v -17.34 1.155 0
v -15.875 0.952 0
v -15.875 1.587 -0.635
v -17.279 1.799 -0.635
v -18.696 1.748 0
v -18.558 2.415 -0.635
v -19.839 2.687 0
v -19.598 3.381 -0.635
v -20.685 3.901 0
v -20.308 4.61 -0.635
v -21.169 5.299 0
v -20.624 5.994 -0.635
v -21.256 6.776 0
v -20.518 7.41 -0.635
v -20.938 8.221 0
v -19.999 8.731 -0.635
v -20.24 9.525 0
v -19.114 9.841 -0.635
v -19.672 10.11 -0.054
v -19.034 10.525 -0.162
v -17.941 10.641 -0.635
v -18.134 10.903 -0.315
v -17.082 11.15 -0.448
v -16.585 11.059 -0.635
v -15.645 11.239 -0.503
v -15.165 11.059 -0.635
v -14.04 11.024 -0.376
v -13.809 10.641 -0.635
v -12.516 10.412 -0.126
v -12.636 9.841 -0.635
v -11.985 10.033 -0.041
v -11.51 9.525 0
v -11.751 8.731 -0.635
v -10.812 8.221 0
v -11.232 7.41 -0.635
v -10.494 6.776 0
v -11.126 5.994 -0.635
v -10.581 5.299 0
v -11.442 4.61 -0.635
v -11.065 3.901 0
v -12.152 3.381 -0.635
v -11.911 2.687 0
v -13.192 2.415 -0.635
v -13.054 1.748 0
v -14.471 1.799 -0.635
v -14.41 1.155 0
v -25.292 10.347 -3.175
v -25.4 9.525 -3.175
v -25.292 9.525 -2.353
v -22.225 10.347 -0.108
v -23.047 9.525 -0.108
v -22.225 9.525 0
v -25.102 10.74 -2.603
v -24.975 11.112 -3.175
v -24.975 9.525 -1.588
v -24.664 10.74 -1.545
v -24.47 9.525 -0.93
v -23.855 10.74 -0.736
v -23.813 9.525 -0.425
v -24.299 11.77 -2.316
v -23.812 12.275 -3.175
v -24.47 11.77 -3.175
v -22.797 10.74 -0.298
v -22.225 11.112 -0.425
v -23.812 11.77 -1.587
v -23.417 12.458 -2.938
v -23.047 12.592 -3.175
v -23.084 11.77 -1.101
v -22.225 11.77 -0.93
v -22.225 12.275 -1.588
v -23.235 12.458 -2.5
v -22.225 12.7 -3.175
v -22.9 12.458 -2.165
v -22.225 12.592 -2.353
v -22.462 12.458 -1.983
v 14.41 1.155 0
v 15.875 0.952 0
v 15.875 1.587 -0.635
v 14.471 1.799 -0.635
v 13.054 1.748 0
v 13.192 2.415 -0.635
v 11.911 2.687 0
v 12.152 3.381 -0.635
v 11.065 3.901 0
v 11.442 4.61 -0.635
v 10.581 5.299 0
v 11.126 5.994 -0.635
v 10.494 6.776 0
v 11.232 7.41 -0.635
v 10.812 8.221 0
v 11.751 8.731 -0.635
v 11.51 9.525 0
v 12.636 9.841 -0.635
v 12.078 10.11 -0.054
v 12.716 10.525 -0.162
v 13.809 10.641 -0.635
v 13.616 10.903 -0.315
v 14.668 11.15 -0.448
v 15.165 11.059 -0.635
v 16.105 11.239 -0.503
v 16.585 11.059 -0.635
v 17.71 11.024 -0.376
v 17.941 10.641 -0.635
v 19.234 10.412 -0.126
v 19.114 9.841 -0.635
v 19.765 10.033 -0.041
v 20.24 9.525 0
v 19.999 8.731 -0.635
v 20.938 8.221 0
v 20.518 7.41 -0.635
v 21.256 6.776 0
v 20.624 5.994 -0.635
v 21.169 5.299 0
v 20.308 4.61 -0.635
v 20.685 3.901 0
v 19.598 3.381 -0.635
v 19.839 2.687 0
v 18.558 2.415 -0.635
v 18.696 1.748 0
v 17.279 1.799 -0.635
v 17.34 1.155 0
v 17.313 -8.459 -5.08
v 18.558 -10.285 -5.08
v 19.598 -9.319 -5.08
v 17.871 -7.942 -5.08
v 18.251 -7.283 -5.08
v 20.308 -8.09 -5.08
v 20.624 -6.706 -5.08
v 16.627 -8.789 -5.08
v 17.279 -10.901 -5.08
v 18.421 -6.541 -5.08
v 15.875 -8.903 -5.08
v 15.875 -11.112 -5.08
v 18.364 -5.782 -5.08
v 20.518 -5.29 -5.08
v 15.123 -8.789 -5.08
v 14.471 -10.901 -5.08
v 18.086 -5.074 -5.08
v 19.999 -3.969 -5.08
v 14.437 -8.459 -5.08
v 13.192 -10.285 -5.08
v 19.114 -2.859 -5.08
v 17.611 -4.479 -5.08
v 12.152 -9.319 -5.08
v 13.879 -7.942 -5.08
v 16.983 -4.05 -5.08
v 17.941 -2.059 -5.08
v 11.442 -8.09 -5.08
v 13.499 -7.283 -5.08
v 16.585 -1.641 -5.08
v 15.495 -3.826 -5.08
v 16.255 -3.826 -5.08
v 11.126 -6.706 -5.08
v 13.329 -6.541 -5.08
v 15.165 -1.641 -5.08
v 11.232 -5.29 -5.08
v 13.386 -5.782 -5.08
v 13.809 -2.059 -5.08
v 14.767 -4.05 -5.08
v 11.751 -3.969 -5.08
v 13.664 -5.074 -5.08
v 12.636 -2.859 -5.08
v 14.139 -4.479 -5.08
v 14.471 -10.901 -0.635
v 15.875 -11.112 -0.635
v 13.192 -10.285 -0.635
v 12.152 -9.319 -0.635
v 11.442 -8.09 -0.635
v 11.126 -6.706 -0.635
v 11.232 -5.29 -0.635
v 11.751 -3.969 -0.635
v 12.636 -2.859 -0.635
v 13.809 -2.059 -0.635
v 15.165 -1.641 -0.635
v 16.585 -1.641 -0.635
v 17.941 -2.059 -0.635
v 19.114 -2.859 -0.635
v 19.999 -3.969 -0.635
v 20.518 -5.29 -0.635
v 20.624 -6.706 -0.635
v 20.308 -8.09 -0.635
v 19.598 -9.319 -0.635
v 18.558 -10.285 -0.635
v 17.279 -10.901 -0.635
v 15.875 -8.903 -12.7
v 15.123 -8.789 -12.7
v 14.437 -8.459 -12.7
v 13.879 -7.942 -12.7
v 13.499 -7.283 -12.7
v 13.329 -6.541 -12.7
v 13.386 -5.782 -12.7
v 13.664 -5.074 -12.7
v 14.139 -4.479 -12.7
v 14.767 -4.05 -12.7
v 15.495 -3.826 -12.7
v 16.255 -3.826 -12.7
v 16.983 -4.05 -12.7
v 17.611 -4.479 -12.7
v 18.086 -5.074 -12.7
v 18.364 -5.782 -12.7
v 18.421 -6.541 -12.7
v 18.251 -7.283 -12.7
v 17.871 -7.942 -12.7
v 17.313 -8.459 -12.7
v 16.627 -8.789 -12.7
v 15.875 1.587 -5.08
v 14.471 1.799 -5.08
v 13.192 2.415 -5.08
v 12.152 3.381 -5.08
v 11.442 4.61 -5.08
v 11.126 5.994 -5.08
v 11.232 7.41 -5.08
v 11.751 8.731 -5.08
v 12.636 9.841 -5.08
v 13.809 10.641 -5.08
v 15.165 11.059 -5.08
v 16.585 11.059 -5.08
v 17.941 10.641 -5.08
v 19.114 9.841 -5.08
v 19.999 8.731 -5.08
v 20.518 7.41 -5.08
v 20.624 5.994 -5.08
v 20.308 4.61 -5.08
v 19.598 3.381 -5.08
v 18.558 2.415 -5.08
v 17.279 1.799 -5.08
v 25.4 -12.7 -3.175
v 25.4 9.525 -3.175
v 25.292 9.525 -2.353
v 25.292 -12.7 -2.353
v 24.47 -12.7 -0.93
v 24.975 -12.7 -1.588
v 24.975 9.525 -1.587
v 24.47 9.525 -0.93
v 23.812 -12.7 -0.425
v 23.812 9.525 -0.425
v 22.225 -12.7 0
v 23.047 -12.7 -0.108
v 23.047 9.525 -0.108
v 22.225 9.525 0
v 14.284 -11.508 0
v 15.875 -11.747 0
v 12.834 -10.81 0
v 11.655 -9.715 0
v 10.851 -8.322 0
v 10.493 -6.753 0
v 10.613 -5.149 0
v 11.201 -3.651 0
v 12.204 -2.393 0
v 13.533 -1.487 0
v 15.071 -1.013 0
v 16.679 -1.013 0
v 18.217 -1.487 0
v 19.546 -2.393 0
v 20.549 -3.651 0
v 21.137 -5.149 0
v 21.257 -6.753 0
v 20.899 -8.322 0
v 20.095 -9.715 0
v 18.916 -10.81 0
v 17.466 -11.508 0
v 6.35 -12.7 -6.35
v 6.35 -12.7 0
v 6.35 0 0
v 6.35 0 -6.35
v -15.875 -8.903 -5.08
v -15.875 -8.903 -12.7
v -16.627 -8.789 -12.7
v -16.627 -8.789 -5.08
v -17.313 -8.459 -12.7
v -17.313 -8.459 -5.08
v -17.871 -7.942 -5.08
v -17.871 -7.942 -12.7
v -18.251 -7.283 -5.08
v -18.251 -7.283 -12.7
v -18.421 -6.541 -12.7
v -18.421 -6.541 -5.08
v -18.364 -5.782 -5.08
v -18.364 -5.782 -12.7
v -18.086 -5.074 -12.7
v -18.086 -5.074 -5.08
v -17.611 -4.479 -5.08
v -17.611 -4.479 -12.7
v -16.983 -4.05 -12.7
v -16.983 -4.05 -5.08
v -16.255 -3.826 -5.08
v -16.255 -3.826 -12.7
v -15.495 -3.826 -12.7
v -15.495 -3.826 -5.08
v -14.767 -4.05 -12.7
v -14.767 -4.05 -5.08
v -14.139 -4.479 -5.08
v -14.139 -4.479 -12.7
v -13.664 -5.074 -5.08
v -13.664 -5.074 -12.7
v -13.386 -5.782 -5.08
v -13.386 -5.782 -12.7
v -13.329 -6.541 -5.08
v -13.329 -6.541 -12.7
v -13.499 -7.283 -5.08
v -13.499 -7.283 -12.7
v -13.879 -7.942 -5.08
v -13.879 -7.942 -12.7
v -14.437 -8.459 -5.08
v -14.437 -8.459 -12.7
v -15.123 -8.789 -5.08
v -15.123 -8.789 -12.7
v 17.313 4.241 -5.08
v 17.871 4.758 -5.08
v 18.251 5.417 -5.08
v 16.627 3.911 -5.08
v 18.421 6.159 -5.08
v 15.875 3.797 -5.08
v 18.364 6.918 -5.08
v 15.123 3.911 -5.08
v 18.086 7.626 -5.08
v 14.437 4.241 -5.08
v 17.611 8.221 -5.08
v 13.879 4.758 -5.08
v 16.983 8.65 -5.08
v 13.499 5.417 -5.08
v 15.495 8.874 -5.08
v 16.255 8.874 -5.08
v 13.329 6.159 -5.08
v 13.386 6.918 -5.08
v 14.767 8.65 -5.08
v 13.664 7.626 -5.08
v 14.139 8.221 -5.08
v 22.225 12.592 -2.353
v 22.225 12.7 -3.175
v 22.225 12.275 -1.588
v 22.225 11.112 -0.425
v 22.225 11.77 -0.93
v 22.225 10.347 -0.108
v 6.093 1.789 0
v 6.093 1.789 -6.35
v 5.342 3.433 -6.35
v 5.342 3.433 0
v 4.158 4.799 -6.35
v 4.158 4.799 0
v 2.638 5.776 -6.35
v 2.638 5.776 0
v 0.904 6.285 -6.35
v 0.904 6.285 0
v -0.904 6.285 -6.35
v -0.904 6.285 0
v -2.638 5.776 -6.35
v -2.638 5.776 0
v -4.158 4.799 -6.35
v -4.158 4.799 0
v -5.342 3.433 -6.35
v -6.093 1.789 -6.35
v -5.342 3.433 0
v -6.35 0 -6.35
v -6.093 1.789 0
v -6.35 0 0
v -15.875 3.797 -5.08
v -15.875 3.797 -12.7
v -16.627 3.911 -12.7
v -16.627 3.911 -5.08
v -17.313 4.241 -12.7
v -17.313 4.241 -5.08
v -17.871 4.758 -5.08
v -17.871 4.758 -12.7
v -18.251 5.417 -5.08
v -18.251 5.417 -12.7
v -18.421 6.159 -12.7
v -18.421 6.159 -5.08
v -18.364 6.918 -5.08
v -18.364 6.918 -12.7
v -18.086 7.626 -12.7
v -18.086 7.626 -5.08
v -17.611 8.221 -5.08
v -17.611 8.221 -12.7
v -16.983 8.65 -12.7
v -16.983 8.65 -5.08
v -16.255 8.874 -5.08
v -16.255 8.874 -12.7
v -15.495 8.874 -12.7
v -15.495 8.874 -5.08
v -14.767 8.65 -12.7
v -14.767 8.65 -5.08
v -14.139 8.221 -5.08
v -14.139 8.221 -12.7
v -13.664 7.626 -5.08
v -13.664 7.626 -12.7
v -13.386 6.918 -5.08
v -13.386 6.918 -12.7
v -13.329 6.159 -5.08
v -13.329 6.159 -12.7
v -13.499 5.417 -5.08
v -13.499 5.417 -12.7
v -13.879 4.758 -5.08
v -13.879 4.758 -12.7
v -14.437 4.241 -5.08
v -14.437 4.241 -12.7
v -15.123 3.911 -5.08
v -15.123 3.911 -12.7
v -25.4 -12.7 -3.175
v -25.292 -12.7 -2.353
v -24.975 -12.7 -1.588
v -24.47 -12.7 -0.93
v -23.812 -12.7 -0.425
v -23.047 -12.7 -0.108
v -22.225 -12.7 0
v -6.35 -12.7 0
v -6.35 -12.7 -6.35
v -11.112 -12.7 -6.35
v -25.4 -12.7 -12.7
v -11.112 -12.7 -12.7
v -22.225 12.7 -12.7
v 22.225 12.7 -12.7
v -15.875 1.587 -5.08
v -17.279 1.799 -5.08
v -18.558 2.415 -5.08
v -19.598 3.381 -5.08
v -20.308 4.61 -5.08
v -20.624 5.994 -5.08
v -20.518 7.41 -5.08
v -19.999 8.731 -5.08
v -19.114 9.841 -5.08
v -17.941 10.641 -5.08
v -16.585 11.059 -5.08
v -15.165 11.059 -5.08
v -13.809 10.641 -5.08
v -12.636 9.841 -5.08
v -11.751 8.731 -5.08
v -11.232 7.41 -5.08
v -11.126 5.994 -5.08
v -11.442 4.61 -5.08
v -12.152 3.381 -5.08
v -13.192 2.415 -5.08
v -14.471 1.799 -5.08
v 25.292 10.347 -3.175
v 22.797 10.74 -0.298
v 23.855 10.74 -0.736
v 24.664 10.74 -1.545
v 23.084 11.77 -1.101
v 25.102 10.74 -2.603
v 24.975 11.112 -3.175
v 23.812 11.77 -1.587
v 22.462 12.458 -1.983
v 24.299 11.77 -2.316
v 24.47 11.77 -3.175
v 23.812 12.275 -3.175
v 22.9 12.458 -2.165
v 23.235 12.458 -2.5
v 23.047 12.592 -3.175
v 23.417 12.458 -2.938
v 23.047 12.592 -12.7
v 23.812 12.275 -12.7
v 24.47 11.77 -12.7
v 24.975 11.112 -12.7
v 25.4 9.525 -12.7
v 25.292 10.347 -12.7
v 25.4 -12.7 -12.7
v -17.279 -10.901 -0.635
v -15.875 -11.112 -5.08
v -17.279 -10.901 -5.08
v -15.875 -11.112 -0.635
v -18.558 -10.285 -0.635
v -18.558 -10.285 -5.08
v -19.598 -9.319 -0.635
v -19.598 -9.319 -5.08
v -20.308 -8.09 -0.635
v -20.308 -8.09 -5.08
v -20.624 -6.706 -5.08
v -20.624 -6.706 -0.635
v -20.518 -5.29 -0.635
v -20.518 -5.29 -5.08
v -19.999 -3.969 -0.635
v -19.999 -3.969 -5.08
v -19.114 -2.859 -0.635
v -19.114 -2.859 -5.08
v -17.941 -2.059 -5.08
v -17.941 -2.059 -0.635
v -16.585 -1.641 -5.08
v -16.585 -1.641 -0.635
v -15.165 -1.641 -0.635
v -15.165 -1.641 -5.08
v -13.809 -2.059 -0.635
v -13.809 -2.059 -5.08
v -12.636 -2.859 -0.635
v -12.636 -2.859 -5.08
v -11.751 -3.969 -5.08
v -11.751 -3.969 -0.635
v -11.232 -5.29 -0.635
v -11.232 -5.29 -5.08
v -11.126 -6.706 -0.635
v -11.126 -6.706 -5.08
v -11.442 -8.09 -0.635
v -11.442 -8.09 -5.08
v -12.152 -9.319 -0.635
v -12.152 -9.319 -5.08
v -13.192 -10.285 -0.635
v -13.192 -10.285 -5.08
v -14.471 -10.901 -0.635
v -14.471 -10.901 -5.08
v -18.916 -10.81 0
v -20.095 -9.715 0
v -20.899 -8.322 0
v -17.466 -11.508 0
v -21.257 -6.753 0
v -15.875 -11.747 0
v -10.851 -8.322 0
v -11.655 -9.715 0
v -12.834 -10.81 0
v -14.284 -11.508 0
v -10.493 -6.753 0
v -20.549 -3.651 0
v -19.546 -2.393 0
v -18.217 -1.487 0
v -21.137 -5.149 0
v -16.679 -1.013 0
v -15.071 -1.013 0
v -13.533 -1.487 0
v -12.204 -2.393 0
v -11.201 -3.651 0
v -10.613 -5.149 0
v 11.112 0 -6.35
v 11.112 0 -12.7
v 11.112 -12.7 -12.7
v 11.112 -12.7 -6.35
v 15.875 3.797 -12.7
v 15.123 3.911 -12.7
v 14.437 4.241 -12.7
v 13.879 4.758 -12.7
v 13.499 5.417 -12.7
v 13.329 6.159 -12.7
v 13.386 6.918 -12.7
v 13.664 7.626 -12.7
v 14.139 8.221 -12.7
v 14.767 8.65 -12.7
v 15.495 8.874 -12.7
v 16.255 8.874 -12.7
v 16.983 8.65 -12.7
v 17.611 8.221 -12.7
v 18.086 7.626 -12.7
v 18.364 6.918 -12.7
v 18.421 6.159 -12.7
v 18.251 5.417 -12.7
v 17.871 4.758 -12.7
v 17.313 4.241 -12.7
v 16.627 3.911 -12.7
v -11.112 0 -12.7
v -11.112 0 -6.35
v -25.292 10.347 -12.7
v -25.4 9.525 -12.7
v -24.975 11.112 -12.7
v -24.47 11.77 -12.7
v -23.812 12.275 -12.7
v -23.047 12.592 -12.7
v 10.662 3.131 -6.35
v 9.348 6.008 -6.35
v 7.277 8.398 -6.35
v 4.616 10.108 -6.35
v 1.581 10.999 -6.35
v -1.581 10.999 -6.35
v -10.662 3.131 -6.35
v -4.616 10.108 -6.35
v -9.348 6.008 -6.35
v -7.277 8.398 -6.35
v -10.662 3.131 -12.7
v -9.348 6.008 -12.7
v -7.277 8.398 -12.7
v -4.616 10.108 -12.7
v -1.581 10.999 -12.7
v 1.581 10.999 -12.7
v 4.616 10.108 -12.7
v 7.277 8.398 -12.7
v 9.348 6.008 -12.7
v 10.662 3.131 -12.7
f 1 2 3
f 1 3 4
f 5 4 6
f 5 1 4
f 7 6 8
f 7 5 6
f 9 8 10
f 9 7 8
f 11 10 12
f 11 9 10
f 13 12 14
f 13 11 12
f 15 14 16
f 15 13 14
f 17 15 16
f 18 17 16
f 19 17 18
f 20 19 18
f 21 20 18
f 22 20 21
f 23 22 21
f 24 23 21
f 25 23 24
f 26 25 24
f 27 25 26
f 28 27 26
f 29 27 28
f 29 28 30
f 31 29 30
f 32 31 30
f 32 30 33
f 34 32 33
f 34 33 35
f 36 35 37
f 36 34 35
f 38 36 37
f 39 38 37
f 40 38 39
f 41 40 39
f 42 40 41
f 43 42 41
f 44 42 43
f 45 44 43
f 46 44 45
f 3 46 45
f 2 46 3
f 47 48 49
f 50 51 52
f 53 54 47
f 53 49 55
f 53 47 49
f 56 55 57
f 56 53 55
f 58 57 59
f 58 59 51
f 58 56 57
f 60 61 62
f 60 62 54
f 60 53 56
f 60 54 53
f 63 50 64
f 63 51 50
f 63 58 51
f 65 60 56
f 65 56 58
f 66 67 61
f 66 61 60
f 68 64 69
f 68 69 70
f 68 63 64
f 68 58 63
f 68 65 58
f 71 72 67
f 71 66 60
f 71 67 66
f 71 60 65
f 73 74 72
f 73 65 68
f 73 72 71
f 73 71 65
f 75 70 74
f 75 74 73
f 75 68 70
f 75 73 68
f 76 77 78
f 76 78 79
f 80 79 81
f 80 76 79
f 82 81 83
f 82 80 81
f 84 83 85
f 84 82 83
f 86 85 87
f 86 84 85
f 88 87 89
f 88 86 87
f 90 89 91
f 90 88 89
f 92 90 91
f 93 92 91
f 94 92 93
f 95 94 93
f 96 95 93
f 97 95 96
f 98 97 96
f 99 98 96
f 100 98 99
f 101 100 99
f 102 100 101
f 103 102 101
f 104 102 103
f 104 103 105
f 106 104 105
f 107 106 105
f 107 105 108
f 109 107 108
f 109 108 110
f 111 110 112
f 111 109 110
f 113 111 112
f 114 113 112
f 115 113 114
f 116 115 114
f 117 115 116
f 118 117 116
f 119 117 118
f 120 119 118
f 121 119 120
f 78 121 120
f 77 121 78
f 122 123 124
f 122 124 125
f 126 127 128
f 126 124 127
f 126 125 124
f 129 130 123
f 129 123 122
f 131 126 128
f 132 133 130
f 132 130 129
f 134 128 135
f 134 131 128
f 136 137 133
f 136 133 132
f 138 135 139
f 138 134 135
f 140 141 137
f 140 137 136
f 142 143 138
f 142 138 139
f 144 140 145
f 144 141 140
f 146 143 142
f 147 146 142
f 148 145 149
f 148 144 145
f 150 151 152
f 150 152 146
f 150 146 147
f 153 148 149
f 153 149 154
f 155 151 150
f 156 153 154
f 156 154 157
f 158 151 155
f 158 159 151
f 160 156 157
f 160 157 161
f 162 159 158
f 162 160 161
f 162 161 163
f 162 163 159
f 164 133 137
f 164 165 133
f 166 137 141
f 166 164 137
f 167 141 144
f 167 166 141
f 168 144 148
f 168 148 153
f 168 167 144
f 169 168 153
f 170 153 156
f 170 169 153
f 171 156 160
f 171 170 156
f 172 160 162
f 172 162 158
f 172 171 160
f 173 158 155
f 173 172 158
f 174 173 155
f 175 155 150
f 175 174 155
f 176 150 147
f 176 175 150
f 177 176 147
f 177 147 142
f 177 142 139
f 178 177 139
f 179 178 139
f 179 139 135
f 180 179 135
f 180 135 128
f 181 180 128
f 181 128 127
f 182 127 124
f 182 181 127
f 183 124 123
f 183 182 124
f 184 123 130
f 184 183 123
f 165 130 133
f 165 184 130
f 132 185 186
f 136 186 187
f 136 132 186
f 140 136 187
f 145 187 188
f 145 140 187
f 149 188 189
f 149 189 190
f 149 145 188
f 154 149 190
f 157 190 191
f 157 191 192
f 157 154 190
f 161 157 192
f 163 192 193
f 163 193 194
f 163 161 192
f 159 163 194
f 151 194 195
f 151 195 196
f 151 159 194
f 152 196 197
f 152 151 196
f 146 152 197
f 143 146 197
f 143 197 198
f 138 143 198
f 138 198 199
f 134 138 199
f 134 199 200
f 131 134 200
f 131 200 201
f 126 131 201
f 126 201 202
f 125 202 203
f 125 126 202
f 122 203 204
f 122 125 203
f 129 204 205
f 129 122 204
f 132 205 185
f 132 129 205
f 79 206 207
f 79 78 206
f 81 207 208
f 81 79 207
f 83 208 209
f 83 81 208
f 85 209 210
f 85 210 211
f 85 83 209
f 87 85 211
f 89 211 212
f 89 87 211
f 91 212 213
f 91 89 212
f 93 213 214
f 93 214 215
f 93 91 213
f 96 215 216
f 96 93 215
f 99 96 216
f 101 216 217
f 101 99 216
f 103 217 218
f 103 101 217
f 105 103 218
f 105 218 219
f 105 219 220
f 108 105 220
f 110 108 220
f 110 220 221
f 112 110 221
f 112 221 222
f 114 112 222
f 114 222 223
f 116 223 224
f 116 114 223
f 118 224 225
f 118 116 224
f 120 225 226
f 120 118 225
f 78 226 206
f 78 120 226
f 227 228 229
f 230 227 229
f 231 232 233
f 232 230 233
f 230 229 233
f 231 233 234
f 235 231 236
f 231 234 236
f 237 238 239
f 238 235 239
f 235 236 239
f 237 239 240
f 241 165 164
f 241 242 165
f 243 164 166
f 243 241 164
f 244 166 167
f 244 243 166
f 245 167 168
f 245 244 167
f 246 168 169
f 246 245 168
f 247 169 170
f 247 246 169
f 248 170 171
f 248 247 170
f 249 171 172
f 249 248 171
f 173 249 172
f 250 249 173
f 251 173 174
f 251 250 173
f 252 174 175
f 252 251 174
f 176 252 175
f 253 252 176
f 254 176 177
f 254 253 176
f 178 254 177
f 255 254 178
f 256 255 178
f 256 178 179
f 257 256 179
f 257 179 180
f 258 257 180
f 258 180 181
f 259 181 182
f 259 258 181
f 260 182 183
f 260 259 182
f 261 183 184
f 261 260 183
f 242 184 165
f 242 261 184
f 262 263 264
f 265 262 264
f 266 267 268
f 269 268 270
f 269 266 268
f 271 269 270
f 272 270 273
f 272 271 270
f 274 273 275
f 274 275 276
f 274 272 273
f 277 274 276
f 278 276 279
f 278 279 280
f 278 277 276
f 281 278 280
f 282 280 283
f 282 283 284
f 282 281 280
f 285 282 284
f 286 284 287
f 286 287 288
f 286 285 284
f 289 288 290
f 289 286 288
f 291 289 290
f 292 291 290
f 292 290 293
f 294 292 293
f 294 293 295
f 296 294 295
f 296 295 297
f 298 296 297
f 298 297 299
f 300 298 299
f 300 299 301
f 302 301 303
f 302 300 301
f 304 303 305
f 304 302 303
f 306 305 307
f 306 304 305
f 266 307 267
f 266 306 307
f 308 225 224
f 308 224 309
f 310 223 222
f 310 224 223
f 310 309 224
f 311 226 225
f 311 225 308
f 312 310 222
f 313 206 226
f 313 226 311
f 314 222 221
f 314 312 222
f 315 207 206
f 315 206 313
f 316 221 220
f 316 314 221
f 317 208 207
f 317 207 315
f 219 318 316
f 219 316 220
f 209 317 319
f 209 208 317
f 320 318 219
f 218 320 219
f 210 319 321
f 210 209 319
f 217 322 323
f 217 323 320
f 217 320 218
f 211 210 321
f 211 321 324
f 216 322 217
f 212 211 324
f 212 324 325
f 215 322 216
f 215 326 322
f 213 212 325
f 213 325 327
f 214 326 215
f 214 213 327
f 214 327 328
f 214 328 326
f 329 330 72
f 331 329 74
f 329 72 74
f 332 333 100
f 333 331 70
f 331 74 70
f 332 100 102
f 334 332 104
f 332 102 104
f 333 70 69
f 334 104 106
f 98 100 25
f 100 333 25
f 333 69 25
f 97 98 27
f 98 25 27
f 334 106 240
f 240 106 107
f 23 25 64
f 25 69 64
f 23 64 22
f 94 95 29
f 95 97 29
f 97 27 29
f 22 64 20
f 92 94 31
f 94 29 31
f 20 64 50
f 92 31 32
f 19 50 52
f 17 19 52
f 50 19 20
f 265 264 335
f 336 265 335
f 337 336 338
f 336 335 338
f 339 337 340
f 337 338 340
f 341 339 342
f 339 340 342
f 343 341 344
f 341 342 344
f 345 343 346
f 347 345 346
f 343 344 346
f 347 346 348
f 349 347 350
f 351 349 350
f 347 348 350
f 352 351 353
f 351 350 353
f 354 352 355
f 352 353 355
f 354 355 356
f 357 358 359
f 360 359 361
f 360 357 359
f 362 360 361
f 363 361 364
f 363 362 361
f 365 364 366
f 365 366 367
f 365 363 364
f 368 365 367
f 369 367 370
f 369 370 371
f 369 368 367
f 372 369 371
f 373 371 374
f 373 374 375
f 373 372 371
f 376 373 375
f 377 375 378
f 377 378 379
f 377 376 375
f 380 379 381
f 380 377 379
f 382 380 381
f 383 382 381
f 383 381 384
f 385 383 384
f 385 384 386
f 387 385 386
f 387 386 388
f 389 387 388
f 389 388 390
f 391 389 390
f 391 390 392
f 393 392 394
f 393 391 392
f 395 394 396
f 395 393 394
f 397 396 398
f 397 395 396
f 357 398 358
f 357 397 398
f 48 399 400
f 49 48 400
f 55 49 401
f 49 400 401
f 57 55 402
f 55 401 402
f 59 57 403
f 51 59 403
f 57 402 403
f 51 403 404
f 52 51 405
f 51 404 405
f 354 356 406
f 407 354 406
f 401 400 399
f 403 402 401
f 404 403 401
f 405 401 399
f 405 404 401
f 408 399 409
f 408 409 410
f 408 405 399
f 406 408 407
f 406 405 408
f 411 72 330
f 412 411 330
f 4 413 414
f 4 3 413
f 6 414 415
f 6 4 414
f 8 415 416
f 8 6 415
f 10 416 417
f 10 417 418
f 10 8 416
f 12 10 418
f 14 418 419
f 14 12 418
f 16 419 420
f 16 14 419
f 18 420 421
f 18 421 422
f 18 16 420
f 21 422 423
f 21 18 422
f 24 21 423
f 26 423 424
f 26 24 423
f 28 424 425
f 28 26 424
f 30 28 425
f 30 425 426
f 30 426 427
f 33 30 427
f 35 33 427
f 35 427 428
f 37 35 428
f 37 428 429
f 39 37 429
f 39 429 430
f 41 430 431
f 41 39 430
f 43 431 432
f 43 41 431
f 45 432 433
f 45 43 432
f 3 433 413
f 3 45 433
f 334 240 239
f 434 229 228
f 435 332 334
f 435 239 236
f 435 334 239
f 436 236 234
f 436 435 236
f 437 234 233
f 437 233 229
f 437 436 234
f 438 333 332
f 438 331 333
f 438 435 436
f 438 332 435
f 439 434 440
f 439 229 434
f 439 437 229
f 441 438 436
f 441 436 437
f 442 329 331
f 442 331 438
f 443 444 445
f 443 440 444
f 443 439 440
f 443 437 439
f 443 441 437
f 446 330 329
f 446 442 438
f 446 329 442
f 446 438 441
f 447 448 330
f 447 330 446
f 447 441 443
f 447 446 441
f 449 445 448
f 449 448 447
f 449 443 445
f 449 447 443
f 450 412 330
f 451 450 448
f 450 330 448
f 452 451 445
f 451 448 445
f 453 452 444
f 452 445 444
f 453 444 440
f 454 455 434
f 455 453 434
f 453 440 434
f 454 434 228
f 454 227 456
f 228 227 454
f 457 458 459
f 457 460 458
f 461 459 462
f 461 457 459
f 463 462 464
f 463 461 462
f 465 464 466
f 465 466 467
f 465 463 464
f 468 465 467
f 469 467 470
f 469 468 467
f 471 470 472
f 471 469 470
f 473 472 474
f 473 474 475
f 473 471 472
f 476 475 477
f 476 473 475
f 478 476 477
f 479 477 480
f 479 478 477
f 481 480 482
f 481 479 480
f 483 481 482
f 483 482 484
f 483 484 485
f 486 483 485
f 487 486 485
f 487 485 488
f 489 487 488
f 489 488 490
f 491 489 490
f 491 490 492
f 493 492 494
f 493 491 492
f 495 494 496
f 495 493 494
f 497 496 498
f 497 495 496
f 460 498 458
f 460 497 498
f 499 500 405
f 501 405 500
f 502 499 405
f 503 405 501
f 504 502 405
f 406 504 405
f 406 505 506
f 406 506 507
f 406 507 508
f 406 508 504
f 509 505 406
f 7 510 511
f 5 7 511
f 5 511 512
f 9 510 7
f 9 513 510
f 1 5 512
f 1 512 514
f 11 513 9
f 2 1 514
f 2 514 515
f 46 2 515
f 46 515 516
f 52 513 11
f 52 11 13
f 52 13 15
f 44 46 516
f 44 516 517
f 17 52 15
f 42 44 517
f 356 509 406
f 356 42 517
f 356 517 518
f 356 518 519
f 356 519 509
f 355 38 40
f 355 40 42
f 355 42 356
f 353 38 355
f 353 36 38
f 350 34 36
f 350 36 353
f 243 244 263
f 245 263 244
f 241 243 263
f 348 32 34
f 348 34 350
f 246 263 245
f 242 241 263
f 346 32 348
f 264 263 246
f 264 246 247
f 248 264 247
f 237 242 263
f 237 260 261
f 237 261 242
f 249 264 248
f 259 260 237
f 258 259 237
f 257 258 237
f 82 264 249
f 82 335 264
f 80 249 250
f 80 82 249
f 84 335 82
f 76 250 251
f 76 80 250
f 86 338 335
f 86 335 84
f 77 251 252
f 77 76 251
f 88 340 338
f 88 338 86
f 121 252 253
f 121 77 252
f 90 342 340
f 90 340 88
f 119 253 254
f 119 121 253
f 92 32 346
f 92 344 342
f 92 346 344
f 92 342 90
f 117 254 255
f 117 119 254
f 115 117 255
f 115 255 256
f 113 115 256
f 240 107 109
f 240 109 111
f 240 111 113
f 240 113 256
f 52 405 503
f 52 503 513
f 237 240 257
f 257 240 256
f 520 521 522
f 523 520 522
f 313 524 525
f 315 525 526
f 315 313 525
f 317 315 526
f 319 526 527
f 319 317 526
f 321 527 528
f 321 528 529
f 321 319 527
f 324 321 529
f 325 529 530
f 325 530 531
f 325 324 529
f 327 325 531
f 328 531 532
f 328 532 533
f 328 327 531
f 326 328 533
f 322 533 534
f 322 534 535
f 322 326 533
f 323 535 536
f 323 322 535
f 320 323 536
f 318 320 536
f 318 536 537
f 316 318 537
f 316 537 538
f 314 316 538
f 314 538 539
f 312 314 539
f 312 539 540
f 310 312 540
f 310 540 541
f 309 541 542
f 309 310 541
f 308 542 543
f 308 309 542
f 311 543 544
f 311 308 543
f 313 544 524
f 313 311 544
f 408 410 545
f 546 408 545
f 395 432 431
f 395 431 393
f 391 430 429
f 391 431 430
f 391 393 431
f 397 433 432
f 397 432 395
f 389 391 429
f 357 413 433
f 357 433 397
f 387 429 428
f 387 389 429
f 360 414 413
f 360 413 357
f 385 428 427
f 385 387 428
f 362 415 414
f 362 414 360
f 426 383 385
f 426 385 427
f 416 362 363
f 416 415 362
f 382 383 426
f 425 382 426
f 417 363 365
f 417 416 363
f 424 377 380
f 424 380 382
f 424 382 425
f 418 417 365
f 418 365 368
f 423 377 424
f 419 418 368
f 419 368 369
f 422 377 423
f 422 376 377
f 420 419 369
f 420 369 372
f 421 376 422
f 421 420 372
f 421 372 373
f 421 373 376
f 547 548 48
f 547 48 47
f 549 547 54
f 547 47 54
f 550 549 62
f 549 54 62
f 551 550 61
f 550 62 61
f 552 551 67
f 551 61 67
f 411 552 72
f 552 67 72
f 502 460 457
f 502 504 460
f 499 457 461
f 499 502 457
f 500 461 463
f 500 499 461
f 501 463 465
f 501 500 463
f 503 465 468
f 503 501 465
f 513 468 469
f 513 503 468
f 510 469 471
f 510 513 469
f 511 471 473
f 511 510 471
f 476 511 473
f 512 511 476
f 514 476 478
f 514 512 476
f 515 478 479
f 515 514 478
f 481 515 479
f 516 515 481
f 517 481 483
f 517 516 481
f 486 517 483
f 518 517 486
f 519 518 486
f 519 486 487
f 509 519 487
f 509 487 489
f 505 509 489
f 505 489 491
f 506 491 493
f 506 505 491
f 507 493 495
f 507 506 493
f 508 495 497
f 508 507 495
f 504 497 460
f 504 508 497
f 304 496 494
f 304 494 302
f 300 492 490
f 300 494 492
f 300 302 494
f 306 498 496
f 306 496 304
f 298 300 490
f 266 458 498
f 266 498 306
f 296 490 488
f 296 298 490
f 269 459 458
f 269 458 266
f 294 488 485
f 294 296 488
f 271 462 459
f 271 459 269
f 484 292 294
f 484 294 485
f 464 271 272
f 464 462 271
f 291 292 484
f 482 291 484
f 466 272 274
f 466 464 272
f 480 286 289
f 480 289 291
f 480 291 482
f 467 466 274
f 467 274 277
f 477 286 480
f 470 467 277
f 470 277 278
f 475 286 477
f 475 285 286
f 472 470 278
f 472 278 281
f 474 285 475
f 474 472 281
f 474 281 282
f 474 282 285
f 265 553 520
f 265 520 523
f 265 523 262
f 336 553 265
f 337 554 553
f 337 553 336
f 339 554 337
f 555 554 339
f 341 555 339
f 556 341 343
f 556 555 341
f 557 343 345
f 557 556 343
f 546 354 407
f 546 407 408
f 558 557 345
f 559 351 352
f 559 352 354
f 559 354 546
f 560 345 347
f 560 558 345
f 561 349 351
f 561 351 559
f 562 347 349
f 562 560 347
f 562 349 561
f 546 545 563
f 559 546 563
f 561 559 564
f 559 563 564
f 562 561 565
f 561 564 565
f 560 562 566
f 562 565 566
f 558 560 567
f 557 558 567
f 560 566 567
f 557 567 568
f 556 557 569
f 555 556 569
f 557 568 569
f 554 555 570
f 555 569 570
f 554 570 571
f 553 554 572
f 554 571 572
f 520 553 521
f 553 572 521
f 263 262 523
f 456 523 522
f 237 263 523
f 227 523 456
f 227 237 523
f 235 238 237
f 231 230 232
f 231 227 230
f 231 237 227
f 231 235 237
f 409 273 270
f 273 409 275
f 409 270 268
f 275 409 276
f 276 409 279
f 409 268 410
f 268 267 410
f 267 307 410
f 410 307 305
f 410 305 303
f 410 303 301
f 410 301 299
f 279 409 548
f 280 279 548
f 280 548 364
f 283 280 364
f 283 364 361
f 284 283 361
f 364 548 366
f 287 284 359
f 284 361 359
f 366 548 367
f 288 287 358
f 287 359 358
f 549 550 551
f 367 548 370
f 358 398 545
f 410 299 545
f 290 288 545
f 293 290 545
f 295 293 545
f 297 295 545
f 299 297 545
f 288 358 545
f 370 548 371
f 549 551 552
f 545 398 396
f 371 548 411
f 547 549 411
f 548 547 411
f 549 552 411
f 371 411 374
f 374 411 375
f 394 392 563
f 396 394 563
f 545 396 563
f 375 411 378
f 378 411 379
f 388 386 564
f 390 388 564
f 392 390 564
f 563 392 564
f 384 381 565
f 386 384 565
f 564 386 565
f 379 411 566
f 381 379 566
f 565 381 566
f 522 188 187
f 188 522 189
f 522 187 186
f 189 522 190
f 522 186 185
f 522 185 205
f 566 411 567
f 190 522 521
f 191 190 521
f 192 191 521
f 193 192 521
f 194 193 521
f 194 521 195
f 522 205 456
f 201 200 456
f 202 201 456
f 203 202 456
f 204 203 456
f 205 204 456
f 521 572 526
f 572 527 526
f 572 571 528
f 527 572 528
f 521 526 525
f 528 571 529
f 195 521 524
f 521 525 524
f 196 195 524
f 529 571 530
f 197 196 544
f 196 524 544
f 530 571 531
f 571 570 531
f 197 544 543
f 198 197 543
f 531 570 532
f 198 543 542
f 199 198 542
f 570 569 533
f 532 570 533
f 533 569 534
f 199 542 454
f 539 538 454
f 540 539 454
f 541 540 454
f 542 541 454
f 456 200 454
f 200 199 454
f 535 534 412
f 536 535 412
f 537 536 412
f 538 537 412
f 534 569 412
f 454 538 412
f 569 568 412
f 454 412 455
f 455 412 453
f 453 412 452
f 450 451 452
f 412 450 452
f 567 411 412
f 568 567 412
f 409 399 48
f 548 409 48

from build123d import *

# Parameters (mm, degrees)
SKETCH1_W                                    = 50.8
SKETCH1_H                                    = 25.4
BOSS_EXTRUDE1_DEPTH                          = 12.7
CBORE_FOR_10_SOCKET_HEAD_CAP_SCREW1_AT_COUNT = 2
CBORE_FOR_10_SOCKET_HEAD_CAP_SCREW1_AT_PITCH = 31.75
CBORE_FOR_10_SOCKET_HEAD_CAP_SCREW1_2_COUNT  = 2
CBORE_FOR_10_SOCKET_HEAD_CAP_SCREW1_2_PITCH  = 34.195796525
CBORE_FOR_10_SOCKET_HEAD_CAP_SCREW1_3_COUNT  = 2
CBORE_FOR_10_SOCKET_HEAD_CAP_SCREW1_3_PITCH  = 12.7
CUT_EXTRUDE1_REACH                           = 33.109
CUT_EXTRUDE2_DEPTH                           = 6.35
FILLET1_R                                    = 3.175


with BuildPart() as part:
    # Sketch1 → Boss-Extrude1 (new body)
    with BuildSketch(Plane.XY):
        Rectangle(SKETCH1_W, SKETCH1_H)
    extrude(amount=-BOSS_EXTRUDE1_DEPTH)

    # Sketch2 → CBORE for #10 Socket Head Cap Screw1 (revolve, cut)
    with BuildSketch(Plane(origin=(-15.875, 6.35, 0), x_dir=(0, -1, 0), z_dir=(1, 0, 0))):
        Polygon((0, 0), (0, 12.7), (2.5527, 12.7), (2.5527, 5.08), (4.7625, 5.08), (4.7625, 0.635), (5.3975, 0), align=None)
    cbore_for_10_socket_head_cap_screw1 = revolve(axis=Axis((-15.875, 6.35, 6.35), (0, 0, -1)), mode=Mode.SUBTRACT)

    # CBORE for #10 Socket Head Cap Screw1 at: CBORE for #10 Socket Head Cap Screw1 ×2
    with Locations(*[(i * CBORE_FOR_10_SOCKET_HEAD_CAP_SCREW1_AT_PITCH, 0, 0) for i in range(1, CBORE_FOR_10_SOCKET_HEAD_CAP_SCREW1_AT_COUNT)]):
        add(cbore_for_10_socket_head_cap_screw1, mode=Mode.SUBTRACT)

    # CBORE for _10 Socket Head Cap Screw1 2: CBORE for #10 Socket Head Cap Screw1 ×2
    with Locations(*[Vector(0.9284766908852594, -0.37139067635410367, 0) * (i * CBORE_FOR_10_SOCKET_HEAD_CAP_SCREW1_2_PITCH) for i in range(1, CBORE_FOR_10_SOCKET_HEAD_CAP_SCREW1_2_COUNT)]):
        add(cbore_for_10_socket_head_cap_screw1, mode=Mode.SUBTRACT)

    # CBORE for _10 Socket Head Cap Screw1 3: CBORE for #10 Socket Head Cap Screw1 ×2
    with Locations(*[(0, -i * CBORE_FOR_10_SOCKET_HEAD_CAP_SCREW1_3_PITCH, 0) for i in range(1, CBORE_FOR_10_SOCKET_HEAD_CAP_SCREW1_3_COUNT)]):
        add(cbore_for_10_socket_head_cap_screw1, mode=Mode.SUBTRACT)

    # Sketch4 → Cut-Extrude1 (cut, up to next)
    with BuildSketch(Plane.XY, mode=Mode.PRIVATE) as cut_extrude1_sk1:
        with BuildLine():
            Line((-6.35, 0), (-6.35, -12.7))
            Line((-6.35, -12.7), (6.35, -12.7))
            Line((6.35, -12.7), (6.35, 0))
            ThreePointArc((6.35, 0), (0, 6.35), (-6.35, 0))
        make_face()
    cut_extrude1_tool1 = extrude(cut_extrude1_sk1.sketch, amount=-CUT_EXTRUDE1_REACH, mode=Mode.PRIVATE) & part.part
    add(cut_extrude1_tool1.solids().sort_by_distance((0, -3.799576, 0))[0], mode=Mode.SUBTRACT)

    # Sketch5 → Cut-Extrude2 (cut)
    with BuildSketch(Plane(origin=(0, 0, -12.7), x_dir=(-1, 0, 0), z_dir=(0, 0, -1))):
        with BuildLine():
            Line((-11.1125, 0), (-11.1125, -12.7))
            Line((-11.1125, -12.7), (11.1125, -12.7))
            Line((11.1125, -12.7), (11.1125, 0))
            ThreePointArc((11.1125, 0), (0, 11.1125), (-11.1125, 0))
        make_face()
    extrude(amount=-CUT_EXTRUDE2_DEPTH, mode=Mode.SUBTRACT)

    # Fillet1
    # the kernel refuses this fillet: 3.175 mm, written as the material it takes off along each edge
    with BuildSketch(Plane(origin=(-22.225, 9.525, -3.175), x_dir=(-1, 0, 0), z_dir=(0, 1, 0))) as fillet1_piece_1_section:
        Polygon((0, 0), (FILLET1_R, 0), (FILLET1_R, FILLET1_R), (0, FILLET1_R), align=None)
    fillet1_piece_1 = extrude(amount=FILLET1_R, mode=Mode.PRIVATE)
    fillet1_piece_1 = fillet1_piece_1 - Plane(origin=(-22.225, 9.525, -3.175), x_dir=(0.7071067811865475, 0, -0.7071067811865475), z_dir=(0, 1, 0)) * Sphere(FILLET1_R, mode=Mode.PRIVATE)
    add(fillet1_piece_1, mode=Mode.SUBTRACT)
    with BuildSketch(Plane(origin=(22.225, 9.525, -3.175), x_dir=(1, 0, 0), z_dir=(0, 1, 0))) as fillet1_piece_2_section:
        Polygon((0, 0), (FILLET1_R, 0), (FILLET1_R, -FILLET1_R), (0, -FILLET1_R), align=None)
    fillet1_piece_2 = extrude(amount=FILLET1_R, mode=Mode.PRIVATE)
    fillet1_piece_2 = fillet1_piece_2 - Plane(origin=(22.225, 9.525, -3.175), x_dir=(-0.7071067811865475, 0, -0.7071067811865475), z_dir=(0, 1, 0)) * Sphere(FILLET1_R, mode=Mode.PRIVATE)
    add(fillet1_piece_2, mode=Mode.SUBTRACT)
    with BuildSketch(Plane(origin=(-25.4, -20.6375, 0), x_dir=(0, 0, -1), z_dir=(0, 1, 0)), Plane(origin=(25.4, 9.525, 0), x_dir=(0, 0, -1), z_dir=(0, -1, 0))) as fillet1_piece_3:
        with BuildLine():
            CenterArc((FILLET1_R, -FILLET1_R), FILLET1_R, 90, 90)
            Line((0, -FILLET1_R), (0, 0))
            Line((0, 0), (FILLET1_R, 0))
        make_face()
    extrude(amount=30.1625, mode=Mode.SUBTRACT)
    with BuildSketch(Plane(origin=(-22.225, 12.7, 0), x_dir=(0, 0, -1), z_dir=(1, 0, 0))) as fillet1_piece_4:
        with BuildLine():
            CenterArc((FILLET1_R, -FILLET1_R), FILLET1_R, 90, 90)
            Line((0, -FILLET1_R), (0, 0))
            Line((0, 0), (FILLET1_R, 0))
        make_face()
    extrude(amount=44.45, mode=Mode.SUBTRACT)
    with BuildSketch(Plane(origin=(-25.4, 12.7, -3.175), x_dir=(1, 0, 0), z_dir=(0, 0, -1))) as fillet1_piece_5:
        with BuildLine():
            CenterArc((FILLET1_R, FILLET1_R), FILLET1_R, 180, 90)
            Line((0, FILLET1_R), (0, 0))
            Line((0, 0), (FILLET1_R, 0))
        make_face()
    extrude(amount=17.4625, mode=Mode.SUBTRACT)
    with BuildSketch(Plane(origin=(25.4, 12.7, -3.175), x_dir=(-1, 0, 0), z_dir=(0, 0, -1))) as fillet1_piece_6:
        with BuildLine():
            CenterArc((FILLET1_R, -FILLET1_R), FILLET1_R, 90, 90)
            Line((0, -FILLET1_R), (0, 0))
            Line((0, 0), (FILLET1_R, 0))
        make_face()
    extrude(amount=17.4625, mode=Mode.SUBTRACT)


solid = part.part
